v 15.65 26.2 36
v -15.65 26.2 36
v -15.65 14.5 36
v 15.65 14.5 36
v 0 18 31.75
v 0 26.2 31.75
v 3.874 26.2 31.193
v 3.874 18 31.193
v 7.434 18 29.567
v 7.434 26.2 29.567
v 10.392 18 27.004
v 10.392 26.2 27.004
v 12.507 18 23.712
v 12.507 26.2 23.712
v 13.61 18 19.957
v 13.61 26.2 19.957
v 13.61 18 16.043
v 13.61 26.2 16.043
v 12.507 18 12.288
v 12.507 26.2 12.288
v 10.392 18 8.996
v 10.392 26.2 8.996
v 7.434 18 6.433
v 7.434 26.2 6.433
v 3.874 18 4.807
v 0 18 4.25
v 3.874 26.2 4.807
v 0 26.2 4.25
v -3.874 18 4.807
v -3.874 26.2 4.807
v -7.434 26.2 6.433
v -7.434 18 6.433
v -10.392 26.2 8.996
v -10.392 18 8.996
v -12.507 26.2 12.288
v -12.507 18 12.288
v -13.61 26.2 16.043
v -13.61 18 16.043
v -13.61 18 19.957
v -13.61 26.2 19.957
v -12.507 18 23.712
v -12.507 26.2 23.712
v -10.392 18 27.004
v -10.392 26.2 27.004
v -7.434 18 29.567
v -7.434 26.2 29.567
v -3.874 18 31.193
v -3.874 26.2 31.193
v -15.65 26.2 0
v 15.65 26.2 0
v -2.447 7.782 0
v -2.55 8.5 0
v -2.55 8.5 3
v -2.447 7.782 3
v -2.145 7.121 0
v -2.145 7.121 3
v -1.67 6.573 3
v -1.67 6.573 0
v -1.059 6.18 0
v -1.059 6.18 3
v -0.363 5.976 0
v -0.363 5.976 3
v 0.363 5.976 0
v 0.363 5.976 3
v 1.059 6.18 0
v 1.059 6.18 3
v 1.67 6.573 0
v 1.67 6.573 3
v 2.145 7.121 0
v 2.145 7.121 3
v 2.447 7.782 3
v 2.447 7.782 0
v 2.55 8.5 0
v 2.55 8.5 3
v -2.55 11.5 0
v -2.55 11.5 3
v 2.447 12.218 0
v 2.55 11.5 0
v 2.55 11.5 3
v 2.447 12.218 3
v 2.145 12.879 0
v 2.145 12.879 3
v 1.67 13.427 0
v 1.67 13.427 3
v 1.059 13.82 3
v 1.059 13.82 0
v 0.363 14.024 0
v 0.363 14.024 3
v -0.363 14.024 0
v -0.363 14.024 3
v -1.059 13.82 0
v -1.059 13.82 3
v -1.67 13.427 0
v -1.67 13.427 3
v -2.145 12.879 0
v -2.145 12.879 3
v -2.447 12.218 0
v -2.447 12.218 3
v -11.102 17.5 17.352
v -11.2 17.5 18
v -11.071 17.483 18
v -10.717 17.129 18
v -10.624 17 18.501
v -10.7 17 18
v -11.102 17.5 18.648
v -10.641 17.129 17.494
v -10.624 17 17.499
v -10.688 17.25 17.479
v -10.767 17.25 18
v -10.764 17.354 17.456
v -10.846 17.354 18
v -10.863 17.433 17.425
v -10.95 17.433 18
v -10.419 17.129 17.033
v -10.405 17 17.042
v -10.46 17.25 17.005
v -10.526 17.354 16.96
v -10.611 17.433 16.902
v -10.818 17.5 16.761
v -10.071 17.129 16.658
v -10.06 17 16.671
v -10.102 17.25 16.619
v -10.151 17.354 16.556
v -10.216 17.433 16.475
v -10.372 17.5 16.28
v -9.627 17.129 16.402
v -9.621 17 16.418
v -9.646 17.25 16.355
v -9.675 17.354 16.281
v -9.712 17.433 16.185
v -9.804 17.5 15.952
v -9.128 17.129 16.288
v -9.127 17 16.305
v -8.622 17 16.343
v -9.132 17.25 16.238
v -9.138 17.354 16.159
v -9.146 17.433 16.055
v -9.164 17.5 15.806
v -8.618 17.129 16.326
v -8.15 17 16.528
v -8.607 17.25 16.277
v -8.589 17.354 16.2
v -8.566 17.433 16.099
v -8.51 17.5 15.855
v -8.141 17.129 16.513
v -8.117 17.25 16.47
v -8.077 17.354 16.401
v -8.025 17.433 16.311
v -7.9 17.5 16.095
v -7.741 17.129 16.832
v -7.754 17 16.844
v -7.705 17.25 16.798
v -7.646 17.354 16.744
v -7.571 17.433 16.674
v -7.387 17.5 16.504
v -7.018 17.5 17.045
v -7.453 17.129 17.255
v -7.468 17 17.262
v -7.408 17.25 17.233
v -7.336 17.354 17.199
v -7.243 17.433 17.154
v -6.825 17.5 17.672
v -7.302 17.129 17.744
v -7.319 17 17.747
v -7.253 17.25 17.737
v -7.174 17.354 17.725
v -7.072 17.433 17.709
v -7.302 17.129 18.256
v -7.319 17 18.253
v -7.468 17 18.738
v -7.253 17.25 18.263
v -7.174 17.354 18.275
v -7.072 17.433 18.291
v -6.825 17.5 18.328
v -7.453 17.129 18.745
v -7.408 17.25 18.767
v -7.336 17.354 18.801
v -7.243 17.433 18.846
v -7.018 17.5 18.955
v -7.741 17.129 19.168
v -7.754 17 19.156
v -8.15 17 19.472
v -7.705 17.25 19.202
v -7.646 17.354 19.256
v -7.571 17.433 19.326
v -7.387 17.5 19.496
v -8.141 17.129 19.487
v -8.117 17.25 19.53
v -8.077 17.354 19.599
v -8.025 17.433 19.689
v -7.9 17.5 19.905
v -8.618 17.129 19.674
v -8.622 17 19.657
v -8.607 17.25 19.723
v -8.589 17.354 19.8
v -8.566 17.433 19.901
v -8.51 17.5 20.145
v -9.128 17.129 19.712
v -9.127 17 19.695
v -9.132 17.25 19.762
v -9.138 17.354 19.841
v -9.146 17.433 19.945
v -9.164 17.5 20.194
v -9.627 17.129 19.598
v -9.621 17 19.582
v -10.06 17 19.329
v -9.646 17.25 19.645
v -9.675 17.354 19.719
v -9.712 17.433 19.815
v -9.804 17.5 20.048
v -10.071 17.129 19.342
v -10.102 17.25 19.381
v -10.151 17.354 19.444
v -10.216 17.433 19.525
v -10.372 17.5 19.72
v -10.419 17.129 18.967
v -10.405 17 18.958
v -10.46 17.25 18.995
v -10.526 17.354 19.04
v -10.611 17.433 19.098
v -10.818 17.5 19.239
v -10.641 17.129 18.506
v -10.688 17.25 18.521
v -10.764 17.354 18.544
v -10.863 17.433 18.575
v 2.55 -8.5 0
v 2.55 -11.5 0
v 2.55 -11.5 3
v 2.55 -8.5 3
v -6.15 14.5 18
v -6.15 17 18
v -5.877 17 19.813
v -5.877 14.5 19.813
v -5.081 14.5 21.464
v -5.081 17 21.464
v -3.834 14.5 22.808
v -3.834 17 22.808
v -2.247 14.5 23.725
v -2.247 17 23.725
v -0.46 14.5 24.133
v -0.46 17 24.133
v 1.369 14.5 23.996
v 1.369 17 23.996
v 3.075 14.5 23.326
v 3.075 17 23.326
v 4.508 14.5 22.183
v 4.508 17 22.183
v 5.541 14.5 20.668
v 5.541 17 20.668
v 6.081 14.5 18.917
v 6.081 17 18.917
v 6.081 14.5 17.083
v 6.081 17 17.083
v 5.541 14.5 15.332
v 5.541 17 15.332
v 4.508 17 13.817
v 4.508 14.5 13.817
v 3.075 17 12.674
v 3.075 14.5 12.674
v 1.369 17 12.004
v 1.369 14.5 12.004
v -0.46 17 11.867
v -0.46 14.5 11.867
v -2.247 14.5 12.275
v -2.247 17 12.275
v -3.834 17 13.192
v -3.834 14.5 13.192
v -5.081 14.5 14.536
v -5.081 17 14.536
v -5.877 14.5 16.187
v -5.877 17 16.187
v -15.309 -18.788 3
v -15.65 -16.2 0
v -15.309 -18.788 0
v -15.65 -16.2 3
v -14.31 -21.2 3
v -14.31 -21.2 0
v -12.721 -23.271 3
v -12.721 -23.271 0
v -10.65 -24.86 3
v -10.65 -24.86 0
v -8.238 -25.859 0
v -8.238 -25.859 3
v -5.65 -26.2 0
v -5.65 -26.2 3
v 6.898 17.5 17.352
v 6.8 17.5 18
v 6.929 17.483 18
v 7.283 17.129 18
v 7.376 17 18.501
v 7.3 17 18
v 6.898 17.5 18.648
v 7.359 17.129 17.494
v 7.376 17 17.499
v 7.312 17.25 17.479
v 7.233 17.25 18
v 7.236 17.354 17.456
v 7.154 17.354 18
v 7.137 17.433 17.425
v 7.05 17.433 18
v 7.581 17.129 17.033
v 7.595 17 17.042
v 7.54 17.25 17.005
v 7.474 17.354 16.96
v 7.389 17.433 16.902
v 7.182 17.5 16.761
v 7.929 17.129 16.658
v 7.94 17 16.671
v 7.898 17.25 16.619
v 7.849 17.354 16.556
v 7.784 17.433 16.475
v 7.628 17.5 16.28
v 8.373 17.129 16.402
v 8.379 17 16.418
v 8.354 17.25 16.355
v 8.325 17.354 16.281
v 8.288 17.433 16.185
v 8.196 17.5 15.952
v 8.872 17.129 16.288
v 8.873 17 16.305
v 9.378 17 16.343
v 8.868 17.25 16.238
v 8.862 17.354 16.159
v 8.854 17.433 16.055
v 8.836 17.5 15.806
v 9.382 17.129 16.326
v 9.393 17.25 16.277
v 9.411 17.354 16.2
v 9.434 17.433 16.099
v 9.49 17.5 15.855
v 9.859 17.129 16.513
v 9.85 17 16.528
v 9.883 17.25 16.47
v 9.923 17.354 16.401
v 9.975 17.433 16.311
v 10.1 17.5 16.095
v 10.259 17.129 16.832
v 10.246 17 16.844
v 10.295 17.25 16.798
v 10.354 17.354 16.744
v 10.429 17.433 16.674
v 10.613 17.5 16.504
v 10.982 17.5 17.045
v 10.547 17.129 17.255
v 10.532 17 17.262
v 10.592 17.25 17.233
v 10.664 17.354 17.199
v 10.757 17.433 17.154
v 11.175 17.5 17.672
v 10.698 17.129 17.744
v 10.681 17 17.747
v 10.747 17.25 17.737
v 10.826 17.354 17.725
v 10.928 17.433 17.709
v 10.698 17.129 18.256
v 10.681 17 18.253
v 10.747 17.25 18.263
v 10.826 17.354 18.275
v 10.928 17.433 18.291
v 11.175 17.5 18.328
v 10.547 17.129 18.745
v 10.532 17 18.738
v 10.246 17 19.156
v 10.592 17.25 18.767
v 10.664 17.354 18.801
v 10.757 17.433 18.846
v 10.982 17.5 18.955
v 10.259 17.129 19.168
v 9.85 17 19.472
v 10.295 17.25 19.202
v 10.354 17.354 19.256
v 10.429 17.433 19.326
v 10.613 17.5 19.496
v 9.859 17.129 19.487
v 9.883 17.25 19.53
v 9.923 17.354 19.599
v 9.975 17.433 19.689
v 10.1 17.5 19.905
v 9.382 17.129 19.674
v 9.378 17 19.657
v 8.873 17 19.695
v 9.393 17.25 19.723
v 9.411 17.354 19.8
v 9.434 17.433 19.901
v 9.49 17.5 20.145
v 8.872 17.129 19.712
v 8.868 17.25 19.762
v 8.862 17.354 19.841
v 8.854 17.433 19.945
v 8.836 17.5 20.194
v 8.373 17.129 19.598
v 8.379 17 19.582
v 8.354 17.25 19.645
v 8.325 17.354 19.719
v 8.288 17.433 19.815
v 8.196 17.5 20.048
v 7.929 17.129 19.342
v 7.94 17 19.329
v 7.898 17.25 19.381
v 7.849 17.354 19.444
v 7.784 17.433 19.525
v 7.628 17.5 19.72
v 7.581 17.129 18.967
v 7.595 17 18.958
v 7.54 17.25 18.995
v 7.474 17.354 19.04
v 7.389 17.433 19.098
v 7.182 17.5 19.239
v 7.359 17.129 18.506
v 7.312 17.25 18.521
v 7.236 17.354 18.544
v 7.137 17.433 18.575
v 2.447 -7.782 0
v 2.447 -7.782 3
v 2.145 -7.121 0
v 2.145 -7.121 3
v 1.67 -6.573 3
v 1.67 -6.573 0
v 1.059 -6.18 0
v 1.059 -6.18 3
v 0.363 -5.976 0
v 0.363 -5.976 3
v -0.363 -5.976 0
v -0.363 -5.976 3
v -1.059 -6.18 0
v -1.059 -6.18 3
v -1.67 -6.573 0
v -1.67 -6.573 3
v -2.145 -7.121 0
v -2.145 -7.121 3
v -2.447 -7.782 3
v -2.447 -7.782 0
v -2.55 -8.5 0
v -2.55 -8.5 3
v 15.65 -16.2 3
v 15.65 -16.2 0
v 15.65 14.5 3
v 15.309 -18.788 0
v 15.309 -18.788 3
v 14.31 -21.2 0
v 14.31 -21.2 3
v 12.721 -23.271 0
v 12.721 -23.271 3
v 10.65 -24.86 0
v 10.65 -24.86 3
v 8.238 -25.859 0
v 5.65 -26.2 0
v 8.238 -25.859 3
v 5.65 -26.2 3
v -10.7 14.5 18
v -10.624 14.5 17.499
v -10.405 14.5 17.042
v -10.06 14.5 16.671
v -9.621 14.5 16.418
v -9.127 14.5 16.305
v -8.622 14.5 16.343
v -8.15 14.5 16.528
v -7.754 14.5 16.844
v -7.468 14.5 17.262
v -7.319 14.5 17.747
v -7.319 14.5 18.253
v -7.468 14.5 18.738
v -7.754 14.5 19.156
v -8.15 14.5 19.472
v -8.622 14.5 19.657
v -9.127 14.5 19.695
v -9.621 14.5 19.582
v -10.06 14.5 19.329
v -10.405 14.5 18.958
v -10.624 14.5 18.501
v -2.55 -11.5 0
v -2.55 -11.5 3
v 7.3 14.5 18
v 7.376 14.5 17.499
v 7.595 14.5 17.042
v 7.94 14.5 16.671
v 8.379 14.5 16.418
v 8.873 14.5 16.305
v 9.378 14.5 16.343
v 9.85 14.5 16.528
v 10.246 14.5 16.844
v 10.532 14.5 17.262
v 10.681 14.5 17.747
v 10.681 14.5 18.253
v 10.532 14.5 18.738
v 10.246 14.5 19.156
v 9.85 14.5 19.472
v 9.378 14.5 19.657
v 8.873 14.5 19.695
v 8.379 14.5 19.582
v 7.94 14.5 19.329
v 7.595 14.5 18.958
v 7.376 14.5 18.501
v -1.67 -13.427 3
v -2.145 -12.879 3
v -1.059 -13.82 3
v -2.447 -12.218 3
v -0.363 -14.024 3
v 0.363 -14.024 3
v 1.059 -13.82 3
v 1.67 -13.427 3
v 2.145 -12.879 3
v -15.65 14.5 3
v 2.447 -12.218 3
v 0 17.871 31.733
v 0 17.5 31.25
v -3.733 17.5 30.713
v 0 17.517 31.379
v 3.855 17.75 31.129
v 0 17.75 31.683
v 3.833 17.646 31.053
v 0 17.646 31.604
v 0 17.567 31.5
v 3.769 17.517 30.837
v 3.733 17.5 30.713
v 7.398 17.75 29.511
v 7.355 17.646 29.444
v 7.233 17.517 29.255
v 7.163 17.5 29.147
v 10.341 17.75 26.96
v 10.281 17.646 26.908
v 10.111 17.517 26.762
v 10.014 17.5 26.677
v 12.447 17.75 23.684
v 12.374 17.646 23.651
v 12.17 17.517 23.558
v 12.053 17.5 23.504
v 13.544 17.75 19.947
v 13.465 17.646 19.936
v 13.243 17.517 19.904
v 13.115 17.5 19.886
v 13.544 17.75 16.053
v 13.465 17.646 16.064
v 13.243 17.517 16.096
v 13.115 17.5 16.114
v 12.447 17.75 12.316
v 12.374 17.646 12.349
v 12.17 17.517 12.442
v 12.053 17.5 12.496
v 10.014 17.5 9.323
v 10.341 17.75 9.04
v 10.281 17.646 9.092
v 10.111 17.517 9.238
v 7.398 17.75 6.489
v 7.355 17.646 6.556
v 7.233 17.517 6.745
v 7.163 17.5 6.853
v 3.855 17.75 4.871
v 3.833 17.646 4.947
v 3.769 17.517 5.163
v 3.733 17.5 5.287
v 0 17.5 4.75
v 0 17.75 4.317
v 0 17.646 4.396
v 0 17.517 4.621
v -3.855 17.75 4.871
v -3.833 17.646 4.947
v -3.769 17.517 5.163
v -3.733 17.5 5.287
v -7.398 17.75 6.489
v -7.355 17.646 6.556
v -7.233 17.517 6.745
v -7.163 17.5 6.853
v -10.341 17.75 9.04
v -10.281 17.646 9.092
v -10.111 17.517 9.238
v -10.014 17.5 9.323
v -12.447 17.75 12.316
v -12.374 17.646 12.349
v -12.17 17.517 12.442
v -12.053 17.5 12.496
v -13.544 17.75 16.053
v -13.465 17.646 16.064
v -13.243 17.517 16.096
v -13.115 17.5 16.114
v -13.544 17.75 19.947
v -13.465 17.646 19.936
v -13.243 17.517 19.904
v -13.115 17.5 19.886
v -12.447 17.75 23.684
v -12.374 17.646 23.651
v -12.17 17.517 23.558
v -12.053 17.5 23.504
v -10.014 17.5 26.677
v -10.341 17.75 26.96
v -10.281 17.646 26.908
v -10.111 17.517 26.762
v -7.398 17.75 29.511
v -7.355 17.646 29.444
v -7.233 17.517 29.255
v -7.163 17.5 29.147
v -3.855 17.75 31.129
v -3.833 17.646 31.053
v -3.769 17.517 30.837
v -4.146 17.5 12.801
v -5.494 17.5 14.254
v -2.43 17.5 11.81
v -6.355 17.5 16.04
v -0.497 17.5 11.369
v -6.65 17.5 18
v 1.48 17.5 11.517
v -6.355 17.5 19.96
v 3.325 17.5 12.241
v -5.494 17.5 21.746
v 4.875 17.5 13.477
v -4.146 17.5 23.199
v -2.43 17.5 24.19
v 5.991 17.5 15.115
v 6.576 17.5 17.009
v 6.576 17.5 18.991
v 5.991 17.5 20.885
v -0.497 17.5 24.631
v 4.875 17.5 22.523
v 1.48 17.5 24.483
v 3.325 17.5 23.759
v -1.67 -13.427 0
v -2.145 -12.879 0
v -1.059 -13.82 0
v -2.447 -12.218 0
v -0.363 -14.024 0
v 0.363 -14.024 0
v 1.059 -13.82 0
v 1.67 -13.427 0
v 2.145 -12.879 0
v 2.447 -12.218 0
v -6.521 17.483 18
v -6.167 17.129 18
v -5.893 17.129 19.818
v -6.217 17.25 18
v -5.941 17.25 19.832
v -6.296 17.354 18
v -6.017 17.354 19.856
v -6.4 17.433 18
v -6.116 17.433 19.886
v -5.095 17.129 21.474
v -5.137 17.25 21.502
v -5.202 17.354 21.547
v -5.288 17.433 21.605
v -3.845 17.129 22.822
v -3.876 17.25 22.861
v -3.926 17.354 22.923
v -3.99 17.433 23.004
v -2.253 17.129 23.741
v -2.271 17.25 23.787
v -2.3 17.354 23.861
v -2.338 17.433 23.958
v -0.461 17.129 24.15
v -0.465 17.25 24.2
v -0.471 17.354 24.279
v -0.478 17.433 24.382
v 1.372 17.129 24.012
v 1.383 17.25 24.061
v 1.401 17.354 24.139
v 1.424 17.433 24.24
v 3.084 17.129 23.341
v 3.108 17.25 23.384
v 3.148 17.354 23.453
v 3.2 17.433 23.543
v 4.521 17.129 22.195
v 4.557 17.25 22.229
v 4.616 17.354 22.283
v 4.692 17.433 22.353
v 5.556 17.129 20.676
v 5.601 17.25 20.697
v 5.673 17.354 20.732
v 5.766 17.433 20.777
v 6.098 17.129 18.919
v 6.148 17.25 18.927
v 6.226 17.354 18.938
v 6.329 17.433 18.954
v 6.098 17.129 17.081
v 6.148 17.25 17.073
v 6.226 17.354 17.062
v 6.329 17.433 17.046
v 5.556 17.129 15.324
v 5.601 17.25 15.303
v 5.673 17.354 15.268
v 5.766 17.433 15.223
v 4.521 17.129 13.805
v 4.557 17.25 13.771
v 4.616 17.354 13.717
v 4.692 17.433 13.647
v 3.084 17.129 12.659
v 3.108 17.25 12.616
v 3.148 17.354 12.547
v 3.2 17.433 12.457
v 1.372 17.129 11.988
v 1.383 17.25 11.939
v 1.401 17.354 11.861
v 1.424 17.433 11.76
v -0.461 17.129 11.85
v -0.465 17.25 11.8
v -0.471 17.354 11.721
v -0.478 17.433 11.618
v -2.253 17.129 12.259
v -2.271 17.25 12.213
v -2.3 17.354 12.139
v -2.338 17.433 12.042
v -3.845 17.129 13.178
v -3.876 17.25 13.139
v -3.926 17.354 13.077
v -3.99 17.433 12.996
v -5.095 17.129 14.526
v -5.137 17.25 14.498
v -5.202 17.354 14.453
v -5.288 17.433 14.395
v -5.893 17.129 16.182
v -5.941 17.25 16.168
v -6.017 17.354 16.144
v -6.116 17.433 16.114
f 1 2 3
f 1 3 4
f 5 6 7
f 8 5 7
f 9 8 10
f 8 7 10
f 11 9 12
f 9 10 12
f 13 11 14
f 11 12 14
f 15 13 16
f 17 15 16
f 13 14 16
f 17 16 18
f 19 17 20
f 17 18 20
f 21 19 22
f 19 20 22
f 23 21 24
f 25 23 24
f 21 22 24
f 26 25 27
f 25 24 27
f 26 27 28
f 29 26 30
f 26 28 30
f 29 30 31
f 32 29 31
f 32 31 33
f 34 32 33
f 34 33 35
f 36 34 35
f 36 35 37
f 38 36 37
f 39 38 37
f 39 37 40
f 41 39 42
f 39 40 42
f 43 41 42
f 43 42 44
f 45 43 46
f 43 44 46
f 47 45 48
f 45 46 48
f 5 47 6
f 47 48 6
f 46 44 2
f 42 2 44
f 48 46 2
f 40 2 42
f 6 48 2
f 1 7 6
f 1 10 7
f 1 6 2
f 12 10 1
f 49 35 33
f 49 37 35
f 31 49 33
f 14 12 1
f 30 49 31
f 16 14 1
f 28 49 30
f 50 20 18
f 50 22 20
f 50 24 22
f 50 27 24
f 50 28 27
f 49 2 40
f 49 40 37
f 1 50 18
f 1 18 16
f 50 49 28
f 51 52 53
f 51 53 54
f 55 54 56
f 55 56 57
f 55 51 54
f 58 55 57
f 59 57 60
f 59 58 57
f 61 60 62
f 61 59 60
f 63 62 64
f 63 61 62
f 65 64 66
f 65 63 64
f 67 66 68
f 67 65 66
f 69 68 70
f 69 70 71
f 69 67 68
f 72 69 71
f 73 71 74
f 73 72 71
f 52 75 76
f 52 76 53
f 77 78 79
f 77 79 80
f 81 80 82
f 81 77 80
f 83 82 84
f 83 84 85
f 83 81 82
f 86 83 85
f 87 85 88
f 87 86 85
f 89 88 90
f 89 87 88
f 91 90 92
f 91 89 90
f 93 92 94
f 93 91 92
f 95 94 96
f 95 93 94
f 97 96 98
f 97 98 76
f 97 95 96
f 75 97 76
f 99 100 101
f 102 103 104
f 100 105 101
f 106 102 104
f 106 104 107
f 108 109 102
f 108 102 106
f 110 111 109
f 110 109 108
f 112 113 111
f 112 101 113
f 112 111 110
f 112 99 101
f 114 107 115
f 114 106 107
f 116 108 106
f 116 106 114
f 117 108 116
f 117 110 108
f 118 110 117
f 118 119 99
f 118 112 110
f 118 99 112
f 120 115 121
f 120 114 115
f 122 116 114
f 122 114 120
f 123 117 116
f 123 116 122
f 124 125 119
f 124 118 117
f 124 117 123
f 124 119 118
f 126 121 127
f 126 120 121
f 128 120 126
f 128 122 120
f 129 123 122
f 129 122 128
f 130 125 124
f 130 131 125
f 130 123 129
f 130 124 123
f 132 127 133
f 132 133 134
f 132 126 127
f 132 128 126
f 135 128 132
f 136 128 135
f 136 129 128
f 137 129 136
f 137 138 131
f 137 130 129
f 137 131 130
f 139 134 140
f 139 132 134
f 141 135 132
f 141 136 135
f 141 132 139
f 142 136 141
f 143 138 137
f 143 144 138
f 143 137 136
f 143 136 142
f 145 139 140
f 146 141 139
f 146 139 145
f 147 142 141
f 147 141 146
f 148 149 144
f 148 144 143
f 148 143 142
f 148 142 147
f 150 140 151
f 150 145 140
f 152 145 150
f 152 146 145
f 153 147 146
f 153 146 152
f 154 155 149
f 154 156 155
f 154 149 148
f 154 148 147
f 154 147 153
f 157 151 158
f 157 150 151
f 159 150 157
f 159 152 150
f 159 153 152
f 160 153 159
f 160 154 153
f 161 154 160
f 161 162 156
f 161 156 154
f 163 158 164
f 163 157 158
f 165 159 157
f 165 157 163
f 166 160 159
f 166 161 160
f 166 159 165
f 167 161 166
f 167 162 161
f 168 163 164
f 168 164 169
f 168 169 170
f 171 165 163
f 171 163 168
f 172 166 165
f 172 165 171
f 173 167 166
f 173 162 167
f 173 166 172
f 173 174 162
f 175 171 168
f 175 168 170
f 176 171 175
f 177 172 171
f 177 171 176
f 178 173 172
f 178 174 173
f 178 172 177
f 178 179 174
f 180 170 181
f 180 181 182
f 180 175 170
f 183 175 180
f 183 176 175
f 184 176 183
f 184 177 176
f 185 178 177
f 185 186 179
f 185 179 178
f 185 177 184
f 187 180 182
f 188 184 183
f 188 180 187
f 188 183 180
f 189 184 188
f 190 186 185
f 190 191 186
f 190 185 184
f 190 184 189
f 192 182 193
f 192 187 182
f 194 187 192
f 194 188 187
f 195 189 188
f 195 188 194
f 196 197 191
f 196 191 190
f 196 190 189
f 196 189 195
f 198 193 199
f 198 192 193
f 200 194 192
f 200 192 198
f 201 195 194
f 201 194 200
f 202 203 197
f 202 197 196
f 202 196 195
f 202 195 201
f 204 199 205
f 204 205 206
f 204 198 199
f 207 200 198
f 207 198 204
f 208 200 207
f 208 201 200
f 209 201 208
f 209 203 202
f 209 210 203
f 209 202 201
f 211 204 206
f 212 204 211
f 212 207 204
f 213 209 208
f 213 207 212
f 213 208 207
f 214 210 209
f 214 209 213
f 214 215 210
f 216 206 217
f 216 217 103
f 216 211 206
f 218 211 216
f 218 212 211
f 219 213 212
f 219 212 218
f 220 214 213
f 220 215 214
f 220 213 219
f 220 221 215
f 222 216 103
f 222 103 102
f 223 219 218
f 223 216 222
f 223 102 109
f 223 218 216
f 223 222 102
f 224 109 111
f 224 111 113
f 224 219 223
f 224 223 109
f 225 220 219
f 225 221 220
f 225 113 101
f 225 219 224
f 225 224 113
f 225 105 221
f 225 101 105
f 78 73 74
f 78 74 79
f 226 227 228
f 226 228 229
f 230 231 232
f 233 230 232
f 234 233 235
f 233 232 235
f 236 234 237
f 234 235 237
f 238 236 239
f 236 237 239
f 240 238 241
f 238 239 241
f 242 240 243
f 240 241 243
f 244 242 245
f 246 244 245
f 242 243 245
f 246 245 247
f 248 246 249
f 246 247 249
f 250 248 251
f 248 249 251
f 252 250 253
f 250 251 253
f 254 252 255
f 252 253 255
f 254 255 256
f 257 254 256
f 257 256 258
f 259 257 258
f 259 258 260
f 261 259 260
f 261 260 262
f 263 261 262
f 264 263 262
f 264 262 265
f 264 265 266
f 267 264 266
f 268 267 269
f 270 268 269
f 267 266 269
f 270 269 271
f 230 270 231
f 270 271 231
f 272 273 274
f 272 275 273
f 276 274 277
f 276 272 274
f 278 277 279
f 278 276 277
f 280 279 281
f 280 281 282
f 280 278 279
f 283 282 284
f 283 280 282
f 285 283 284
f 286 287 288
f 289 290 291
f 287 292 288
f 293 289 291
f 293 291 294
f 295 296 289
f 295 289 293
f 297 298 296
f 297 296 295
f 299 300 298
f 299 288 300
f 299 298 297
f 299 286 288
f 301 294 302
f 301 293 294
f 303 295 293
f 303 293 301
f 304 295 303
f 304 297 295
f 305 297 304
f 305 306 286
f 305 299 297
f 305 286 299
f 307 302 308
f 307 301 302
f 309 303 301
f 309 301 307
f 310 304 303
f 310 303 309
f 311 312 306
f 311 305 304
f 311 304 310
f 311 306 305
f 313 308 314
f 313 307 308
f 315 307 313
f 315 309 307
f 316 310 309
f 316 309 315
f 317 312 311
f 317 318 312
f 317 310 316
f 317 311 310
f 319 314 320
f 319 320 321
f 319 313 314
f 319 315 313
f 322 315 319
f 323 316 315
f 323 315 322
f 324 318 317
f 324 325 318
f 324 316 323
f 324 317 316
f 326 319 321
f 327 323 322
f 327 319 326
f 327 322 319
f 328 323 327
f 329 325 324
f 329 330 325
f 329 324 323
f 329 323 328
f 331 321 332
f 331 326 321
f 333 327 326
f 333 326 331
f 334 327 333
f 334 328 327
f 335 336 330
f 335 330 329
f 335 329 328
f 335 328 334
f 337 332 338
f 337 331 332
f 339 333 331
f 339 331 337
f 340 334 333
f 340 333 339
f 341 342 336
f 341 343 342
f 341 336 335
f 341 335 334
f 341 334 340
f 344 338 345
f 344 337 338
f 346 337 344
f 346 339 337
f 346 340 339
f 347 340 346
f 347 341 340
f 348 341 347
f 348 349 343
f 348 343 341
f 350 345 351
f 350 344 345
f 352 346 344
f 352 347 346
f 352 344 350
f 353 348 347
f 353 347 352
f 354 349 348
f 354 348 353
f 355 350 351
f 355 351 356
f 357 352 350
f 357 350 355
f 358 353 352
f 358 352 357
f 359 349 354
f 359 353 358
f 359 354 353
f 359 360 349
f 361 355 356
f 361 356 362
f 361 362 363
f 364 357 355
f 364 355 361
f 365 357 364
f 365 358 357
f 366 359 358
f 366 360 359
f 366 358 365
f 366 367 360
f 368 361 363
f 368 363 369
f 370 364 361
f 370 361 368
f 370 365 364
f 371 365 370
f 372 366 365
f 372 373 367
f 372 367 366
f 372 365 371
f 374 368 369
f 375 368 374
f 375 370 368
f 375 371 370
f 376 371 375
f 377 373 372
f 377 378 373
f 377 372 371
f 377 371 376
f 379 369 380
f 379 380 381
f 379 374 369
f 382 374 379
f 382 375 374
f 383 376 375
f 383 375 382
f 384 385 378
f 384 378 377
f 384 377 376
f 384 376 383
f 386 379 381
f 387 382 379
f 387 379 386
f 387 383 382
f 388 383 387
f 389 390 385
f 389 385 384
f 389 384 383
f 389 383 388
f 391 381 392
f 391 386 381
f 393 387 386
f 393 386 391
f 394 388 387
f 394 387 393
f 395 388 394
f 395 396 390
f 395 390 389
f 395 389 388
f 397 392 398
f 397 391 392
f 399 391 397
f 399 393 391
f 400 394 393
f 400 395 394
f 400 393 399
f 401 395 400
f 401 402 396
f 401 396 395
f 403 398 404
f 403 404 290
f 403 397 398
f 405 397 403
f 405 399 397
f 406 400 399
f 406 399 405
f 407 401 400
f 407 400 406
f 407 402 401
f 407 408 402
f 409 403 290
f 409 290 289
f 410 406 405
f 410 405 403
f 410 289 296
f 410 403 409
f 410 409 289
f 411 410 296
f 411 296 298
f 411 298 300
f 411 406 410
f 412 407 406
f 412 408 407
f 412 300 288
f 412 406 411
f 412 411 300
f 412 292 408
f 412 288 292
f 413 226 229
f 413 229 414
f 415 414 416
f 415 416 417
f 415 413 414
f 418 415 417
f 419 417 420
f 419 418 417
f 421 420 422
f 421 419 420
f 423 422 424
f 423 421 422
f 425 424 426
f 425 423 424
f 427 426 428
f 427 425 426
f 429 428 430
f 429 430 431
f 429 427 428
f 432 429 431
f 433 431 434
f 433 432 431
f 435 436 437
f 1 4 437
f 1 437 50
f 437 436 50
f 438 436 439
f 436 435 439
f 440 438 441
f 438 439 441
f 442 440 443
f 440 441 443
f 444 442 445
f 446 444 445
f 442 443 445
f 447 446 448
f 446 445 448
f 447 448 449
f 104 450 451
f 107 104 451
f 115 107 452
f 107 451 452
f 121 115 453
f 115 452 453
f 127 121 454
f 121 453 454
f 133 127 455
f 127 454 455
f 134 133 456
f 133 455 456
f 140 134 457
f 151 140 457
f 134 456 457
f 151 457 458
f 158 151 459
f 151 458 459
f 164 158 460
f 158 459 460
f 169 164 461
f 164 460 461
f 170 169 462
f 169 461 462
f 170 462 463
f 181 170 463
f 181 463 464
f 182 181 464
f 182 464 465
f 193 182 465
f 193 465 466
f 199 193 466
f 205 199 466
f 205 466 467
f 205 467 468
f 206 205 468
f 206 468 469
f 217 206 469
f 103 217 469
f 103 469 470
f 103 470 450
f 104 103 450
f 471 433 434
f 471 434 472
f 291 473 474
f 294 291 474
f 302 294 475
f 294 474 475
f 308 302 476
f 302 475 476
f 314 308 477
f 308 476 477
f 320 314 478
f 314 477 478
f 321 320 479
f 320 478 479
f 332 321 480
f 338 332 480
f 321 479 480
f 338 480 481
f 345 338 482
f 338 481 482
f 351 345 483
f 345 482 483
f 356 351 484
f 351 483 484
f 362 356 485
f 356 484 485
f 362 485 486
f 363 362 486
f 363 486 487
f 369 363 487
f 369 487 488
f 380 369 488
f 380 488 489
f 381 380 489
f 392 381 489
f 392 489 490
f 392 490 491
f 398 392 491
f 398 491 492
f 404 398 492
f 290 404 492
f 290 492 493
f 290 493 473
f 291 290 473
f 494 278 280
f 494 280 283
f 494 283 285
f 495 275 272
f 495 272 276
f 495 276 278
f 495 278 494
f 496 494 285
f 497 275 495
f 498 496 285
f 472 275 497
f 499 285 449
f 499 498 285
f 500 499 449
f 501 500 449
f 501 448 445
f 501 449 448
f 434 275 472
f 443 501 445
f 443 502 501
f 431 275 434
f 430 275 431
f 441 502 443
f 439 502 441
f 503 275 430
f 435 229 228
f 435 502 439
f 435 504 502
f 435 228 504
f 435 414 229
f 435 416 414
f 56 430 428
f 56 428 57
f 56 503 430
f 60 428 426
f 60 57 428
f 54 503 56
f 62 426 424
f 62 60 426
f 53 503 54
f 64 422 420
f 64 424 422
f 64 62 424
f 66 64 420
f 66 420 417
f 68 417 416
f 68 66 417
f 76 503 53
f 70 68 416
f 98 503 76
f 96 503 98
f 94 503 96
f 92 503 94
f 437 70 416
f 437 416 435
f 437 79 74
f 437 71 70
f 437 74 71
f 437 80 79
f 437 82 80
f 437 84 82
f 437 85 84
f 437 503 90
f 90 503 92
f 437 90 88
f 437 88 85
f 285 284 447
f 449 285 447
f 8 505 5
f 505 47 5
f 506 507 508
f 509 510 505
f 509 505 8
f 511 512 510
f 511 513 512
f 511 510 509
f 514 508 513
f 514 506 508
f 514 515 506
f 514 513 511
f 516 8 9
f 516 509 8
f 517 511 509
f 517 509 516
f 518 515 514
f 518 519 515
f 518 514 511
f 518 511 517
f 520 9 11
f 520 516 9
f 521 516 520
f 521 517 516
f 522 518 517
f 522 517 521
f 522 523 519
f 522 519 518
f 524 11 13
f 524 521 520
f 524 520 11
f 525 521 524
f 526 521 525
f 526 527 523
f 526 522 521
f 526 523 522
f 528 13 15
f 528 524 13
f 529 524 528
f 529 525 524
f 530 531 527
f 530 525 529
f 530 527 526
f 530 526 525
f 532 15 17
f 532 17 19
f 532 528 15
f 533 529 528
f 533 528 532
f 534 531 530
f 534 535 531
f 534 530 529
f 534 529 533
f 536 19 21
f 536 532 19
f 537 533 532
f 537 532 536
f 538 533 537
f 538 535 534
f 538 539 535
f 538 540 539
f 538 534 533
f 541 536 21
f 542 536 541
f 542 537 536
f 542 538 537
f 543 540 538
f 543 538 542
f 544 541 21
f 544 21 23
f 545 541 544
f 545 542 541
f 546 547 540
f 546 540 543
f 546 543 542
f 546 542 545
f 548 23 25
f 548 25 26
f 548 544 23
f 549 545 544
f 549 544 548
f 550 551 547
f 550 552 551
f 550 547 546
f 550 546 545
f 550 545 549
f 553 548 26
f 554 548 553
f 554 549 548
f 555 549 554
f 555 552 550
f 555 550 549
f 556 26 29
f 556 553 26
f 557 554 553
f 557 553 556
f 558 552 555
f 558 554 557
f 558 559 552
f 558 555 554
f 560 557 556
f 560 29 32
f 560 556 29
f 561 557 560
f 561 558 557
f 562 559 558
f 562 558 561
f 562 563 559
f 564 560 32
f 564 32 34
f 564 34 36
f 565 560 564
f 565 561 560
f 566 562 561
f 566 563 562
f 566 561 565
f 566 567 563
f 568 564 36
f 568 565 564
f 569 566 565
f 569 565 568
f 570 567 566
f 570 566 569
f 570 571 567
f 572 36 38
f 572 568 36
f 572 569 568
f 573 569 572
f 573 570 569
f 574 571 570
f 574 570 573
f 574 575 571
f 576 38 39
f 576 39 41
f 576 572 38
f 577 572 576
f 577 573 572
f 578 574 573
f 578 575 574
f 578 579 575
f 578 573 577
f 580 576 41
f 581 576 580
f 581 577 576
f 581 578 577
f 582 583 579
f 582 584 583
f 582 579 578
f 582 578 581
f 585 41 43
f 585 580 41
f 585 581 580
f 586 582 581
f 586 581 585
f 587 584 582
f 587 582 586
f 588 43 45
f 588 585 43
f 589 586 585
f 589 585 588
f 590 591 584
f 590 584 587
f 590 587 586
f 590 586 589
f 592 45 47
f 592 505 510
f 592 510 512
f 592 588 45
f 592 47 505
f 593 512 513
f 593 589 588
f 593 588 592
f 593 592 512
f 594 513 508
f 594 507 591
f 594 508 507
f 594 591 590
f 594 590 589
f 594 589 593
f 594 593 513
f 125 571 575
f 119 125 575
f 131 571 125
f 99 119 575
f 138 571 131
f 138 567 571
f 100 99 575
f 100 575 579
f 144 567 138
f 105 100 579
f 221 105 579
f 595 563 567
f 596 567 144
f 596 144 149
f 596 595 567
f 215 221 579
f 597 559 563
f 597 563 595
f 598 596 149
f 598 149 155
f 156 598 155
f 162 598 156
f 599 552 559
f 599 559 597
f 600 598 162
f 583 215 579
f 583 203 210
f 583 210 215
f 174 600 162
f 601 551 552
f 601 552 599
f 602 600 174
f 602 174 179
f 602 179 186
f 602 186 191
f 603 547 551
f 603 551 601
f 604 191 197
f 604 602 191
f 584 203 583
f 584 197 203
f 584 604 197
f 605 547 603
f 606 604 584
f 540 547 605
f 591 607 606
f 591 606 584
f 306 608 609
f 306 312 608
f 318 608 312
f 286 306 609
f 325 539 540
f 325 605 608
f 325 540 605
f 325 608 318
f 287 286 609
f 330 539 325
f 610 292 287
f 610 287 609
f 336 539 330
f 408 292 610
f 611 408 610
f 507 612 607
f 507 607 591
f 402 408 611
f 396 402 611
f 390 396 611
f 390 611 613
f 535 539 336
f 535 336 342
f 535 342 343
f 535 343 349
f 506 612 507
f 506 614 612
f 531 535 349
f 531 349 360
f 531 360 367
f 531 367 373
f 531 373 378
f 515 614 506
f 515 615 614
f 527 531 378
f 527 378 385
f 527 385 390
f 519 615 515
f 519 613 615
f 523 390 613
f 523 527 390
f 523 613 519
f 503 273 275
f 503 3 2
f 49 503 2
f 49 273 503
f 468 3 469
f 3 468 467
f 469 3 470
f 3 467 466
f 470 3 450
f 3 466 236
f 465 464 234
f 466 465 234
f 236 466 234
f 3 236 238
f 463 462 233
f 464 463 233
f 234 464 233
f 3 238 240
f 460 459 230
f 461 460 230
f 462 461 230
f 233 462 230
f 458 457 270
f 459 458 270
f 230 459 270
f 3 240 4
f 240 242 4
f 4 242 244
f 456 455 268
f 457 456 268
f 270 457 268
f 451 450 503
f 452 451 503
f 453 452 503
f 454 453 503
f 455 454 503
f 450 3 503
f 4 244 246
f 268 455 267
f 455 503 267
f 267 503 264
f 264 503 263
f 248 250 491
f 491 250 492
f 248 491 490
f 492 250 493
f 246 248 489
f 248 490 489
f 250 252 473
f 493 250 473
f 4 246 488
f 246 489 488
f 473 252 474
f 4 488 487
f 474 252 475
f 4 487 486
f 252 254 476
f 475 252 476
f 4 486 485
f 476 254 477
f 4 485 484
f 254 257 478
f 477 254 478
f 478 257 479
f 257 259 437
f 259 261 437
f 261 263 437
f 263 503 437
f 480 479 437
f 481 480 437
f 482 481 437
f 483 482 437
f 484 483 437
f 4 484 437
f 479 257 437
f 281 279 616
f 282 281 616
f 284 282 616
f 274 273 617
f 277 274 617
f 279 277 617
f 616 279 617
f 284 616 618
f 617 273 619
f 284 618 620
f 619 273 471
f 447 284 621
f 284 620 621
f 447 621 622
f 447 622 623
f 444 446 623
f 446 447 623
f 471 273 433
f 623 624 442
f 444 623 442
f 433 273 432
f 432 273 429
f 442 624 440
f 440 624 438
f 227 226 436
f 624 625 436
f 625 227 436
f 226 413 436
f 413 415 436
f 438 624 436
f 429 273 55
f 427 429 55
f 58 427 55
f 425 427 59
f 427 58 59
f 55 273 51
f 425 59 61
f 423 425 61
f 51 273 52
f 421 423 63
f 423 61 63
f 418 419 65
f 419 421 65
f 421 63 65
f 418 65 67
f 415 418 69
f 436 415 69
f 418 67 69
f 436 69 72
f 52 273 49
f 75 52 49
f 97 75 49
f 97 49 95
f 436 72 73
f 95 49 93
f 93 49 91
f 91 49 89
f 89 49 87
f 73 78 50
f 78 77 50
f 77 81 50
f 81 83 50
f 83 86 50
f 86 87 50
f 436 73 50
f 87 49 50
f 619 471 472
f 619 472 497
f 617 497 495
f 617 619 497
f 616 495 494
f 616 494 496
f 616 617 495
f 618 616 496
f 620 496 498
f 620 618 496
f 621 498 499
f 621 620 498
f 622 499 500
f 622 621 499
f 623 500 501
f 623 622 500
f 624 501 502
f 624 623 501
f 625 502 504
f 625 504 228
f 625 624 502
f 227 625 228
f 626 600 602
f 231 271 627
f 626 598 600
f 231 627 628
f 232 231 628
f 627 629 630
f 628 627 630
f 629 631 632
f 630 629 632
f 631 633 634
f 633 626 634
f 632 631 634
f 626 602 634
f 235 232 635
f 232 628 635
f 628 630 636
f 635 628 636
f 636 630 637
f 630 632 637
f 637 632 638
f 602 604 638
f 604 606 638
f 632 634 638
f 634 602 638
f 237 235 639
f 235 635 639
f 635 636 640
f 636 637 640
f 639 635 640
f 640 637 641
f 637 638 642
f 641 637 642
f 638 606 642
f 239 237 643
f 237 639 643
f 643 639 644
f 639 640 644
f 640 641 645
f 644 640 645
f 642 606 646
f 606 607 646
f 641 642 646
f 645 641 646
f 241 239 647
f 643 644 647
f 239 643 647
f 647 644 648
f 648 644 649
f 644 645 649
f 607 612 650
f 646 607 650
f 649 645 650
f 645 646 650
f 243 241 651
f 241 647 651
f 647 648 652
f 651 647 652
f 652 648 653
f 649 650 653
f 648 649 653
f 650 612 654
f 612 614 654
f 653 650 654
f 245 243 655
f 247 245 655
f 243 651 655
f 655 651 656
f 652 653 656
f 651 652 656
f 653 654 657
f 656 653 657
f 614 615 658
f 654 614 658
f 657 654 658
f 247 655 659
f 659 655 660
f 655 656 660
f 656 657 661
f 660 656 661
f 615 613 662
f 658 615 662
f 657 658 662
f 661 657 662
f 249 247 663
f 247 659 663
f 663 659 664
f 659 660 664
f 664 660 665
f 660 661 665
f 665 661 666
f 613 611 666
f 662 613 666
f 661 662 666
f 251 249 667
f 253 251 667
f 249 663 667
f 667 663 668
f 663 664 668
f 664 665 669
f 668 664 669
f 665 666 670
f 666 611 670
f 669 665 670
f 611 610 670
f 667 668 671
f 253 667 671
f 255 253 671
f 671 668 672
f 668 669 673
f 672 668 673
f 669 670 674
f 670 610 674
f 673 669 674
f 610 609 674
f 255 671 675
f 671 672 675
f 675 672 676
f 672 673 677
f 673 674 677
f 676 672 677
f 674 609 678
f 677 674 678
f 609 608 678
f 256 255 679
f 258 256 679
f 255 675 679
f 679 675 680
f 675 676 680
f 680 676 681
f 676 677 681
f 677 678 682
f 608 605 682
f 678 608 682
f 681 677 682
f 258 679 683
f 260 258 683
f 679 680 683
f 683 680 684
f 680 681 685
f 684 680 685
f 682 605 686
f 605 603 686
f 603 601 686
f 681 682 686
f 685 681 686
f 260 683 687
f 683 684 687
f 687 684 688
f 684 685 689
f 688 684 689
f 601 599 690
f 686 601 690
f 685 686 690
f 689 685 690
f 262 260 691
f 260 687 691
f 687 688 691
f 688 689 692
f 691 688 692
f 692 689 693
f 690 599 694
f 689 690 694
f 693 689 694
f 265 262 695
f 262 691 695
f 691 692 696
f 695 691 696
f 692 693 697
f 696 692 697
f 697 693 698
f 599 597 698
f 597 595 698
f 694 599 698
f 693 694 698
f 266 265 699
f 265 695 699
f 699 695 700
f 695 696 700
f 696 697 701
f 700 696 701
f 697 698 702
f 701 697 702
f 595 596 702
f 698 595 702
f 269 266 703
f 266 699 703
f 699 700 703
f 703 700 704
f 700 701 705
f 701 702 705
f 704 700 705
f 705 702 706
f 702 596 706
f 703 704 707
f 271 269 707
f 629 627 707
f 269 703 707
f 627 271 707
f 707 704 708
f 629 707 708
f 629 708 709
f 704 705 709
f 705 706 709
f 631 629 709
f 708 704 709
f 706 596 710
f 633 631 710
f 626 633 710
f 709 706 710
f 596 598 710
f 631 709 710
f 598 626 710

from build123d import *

# Parameters (mm, degrees)
SKETCH1_W                      = 31.3
SKETCH1_H                      = 52.4
BOSS_EXTRUDE1_DEPTH            = 3
SKETCH2_W                      = 31.3
SKETCH2_H                      = 3
BOSS_EXTRUDE2_DEPTH            = 33
SKETCH3_W                      = 31.3
SKETCH3_H                      = 8.7
BOSS_EXTRUDE3_DEPTH            = 33
SKETCH5_R                      = 13.75
CUT_EXTRUDE1_DEPTH             = 8.7
SKETCH6_R                      = 6.15
CUT_EXTRUDE2_DEPTH             = 3
CUT_EXTRUDE3_REACH             = 58.546
SKETCH7_R                      = 1.7
CUT_EXTRUDE3_DIRECTION_2_REACH = 58.546
FILLET4_R                      = 0.5
CUT_EXTRUDE6_DEPTH             = 3
FILLET5_R                      = 10


with BuildPart() as part:
    # Sketch1 → Boss-Extrude1 (new body)
    with BuildSketch(Plane.XY):
        Rectangle(SKETCH1_W, SKETCH1_H)
    extrude(amount=BOSS_EXTRUDE1_DEPTH)

    # Sketch2 → Boss-Extrude2 (add)
    with BuildSketch(Plane.XY.offset(3)):
        with Locations((0, 16)):
            Rectangle(SKETCH2_W, SKETCH2_H)
    extrude(amount=BOSS_EXTRUDE2_DEPTH)

    # Sketch3 → Boss-Extrude3 (add)
    with BuildSketch(Plane.XY.offset(3)):
        with Locations((0, 21.85)):
            Rectangle(SKETCH3_W, SKETCH3_H)
    extrude(amount=BOSS_EXTRUDE3_DEPTH)

    # Sketch5 → Cut-Extrude1 (cut)
    with BuildSketch(Plane(origin=(0, 26.2, 0), x_dir=(1, 0, 0), z_dir=(0, 1, 0))):
        with Locations(Location((0, -18, 0), (0, 0, 270))):
            Circle(SKETCH5_R)
    extrude(amount=-CUT_EXTRUDE1_DEPTH, mode=Mode.SUBTRACT)

    # Sketch6 → Cut-Extrude2 (cut)
    with BuildSketch(Plane(origin=(0, 17.5, 0), x_dir=(1, 0, 0), z_dir=(0, 1, 0))):
        with Locations(Location((0, -18, 0), (0, 0, 180))):
            Circle(SKETCH6_R)
    extrude(amount=-CUT_EXTRUDE2_DEPTH, mode=Mode.SUBTRACT)

    # Cut-Extrude3: up to this face of the body (flat: up to its plane)
    cut_extrude3_end = Plane(part.part.faces().sort_by_distance((0, -26.2, 1.5))[0])
    # Sketch7 → Cut-Extrude3 (cut, up to the picked face)
    with BuildSketch(Plane.XZ.offset(-14.5), mode=Mode.PRIVATE) as cut_extrude3_sk1:
        with Locations(Location((-9, 18, 0), (0, 0, 180))):
            Circle(SKETCH7_R)
    cut_extrude3_tool1 = split(extrude(cut_extrude3_sk1.sketch, amount=CUT_EXTRUDE3_REACH, mode=Mode.PRIVATE), bisect_by=cut_extrude3_end, keep=Keep.BOTH, mode=Mode.PRIVATE)
    # Sketch7 → Cut-Extrude3 (cut, up to the picked face)
    with BuildSketch(Plane.XZ.offset(-14.5), mode=Mode.PRIVATE) as cut_extrude3_sk2:
        with Locations(Location((9, 18, 0), (0, 0, 180))):
            Circle(SKETCH7_R)
    cut_extrude3_tool2 = split(extrude(cut_extrude3_sk2.sketch, amount=CUT_EXTRUDE3_REACH, mode=Mode.PRIVATE), bisect_by=cut_extrude3_end, keep=Keep.BOTH, mode=Mode.PRIVATE)
    add(cut_extrude3_tool1.solids().sort_by(Axis((-9, 14.5, 18), (0, -1, 0)))[0], mode=Mode.SUBTRACT)
    add(cut_extrude3_tool2.solids().sort_by(Axis((9, 14.5, 18), (0, -1, 0)))[0], mode=Mode.SUBTRACT)

    # Cut-Extrude3 direction 2: up to this face of the body (flat: up to its plane)
    cut_extrude3_direction_2_end = Plane(part.part.faces().sort_by_distance((0, 17.5, 4.63890873))[0])
    # Sketch7 → Cut-Extrude3 direction 2 (cut, up to the picked face)
    with BuildSketch(Plane.XZ.offset(-14.5), mode=Mode.PRIVATE) as cut_extrude3_direction_2_sk1:
        with Locations(Location((-9, 18, 0), (0, 0, 180))):
            Circle(SKETCH7_R)
    cut_extrude3_direction_2_tool1 = split(extrude(cut_extrude3_direction_2_sk1.sketch, amount=-CUT_EXTRUDE3_DIRECTION_2_REACH, mode=Mode.PRIVATE), bisect_by=cut_extrude3_direction_2_end, keep=Keep.BOTH, mode=Mode.PRIVATE)
    # Sketch7 → Cut-Extrude3 direction 2 (cut, up to the picked face)
    with BuildSketch(Plane.XZ.offset(-14.5), mode=Mode.PRIVATE) as cut_extrude3_direction_2_sk2:
        with Locations(Location((9, 18, 0), (0, 0, 180))):
            Circle(SKETCH7_R)
    cut_extrude3_direction_2_tool2 = split(extrude(cut_extrude3_direction_2_sk2.sketch, amount=-CUT_EXTRUDE3_DIRECTION_2_REACH, mode=Mode.PRIVATE), bisect_by=cut_extrude3_direction_2_end, keep=Keep.BOTH, mode=Mode.PRIVATE)
    add(cut_extrude3_direction_2_tool1.solids().sort_by(Axis((-9, 14.5, 18), (0, 1, 0)))[0], mode=Mode.SUBTRACT)
    add(cut_extrude3_direction_2_tool2.solids().sort_by(Axis((9, 14.5, 18), (0, 1, 0)))[0], mode=Mode.SUBTRACT)

    # Fillet4
    fillet4_edges = [part.edges().sort_by_distance(p)[0] for p in [
        (0, 17.5, 4.25),
        (6.15, 17.5, 18),
        (-7.3, 17.5, 18),
        (10.7, 17.5, 18),
    ]]
    fillet(fillet4_edges, radius=FILLET4_R)

    # Sketch10 → Cut-Extrude6 (cut)
    with BuildSketch(Plane(origin=(0, 0, 0), x_dir=(-1, 0, 0), z_dir=(0, 0, -1))):
        with BuildLine():
            Line((-2.55, -11.5), (-2.55, -8.5))
            ThreePointArc((-2.55, -8.5), (0, -5.95), (2.55, -8.5))
            Line((2.55, -8.5), (2.55, -11.5))
            ThreePointArc((2.55, -11.5), (0, -14.05), (-2.55, -11.5))
        make_face()
        with BuildLine():
            Line((-2.55, 8.5), (-2.55, 11.5))
            ThreePointArc((-2.55, 11.5), (0, 14.05), (2.55, 11.5))
            Line((2.55, 11.5), (2.55, 8.5))
            ThreePointArc((2.55, 8.5), (0, 5.95), (-2.55, 8.5))
        make_face()
    extrude(amount=-CUT_EXTRUDE6_DEPTH, mode=Mode.SUBTRACT)

    # Fillet5
    fillet5_edges = [part.edges().sort_by_distance(p)[0] for p in [
        (15.65, -26.2, 1.5),
        (-15.65, -26.2, 1.5),
    ]]
    fillet(fillet5_edges, radius=FILLET5_R)


solid = part.part
